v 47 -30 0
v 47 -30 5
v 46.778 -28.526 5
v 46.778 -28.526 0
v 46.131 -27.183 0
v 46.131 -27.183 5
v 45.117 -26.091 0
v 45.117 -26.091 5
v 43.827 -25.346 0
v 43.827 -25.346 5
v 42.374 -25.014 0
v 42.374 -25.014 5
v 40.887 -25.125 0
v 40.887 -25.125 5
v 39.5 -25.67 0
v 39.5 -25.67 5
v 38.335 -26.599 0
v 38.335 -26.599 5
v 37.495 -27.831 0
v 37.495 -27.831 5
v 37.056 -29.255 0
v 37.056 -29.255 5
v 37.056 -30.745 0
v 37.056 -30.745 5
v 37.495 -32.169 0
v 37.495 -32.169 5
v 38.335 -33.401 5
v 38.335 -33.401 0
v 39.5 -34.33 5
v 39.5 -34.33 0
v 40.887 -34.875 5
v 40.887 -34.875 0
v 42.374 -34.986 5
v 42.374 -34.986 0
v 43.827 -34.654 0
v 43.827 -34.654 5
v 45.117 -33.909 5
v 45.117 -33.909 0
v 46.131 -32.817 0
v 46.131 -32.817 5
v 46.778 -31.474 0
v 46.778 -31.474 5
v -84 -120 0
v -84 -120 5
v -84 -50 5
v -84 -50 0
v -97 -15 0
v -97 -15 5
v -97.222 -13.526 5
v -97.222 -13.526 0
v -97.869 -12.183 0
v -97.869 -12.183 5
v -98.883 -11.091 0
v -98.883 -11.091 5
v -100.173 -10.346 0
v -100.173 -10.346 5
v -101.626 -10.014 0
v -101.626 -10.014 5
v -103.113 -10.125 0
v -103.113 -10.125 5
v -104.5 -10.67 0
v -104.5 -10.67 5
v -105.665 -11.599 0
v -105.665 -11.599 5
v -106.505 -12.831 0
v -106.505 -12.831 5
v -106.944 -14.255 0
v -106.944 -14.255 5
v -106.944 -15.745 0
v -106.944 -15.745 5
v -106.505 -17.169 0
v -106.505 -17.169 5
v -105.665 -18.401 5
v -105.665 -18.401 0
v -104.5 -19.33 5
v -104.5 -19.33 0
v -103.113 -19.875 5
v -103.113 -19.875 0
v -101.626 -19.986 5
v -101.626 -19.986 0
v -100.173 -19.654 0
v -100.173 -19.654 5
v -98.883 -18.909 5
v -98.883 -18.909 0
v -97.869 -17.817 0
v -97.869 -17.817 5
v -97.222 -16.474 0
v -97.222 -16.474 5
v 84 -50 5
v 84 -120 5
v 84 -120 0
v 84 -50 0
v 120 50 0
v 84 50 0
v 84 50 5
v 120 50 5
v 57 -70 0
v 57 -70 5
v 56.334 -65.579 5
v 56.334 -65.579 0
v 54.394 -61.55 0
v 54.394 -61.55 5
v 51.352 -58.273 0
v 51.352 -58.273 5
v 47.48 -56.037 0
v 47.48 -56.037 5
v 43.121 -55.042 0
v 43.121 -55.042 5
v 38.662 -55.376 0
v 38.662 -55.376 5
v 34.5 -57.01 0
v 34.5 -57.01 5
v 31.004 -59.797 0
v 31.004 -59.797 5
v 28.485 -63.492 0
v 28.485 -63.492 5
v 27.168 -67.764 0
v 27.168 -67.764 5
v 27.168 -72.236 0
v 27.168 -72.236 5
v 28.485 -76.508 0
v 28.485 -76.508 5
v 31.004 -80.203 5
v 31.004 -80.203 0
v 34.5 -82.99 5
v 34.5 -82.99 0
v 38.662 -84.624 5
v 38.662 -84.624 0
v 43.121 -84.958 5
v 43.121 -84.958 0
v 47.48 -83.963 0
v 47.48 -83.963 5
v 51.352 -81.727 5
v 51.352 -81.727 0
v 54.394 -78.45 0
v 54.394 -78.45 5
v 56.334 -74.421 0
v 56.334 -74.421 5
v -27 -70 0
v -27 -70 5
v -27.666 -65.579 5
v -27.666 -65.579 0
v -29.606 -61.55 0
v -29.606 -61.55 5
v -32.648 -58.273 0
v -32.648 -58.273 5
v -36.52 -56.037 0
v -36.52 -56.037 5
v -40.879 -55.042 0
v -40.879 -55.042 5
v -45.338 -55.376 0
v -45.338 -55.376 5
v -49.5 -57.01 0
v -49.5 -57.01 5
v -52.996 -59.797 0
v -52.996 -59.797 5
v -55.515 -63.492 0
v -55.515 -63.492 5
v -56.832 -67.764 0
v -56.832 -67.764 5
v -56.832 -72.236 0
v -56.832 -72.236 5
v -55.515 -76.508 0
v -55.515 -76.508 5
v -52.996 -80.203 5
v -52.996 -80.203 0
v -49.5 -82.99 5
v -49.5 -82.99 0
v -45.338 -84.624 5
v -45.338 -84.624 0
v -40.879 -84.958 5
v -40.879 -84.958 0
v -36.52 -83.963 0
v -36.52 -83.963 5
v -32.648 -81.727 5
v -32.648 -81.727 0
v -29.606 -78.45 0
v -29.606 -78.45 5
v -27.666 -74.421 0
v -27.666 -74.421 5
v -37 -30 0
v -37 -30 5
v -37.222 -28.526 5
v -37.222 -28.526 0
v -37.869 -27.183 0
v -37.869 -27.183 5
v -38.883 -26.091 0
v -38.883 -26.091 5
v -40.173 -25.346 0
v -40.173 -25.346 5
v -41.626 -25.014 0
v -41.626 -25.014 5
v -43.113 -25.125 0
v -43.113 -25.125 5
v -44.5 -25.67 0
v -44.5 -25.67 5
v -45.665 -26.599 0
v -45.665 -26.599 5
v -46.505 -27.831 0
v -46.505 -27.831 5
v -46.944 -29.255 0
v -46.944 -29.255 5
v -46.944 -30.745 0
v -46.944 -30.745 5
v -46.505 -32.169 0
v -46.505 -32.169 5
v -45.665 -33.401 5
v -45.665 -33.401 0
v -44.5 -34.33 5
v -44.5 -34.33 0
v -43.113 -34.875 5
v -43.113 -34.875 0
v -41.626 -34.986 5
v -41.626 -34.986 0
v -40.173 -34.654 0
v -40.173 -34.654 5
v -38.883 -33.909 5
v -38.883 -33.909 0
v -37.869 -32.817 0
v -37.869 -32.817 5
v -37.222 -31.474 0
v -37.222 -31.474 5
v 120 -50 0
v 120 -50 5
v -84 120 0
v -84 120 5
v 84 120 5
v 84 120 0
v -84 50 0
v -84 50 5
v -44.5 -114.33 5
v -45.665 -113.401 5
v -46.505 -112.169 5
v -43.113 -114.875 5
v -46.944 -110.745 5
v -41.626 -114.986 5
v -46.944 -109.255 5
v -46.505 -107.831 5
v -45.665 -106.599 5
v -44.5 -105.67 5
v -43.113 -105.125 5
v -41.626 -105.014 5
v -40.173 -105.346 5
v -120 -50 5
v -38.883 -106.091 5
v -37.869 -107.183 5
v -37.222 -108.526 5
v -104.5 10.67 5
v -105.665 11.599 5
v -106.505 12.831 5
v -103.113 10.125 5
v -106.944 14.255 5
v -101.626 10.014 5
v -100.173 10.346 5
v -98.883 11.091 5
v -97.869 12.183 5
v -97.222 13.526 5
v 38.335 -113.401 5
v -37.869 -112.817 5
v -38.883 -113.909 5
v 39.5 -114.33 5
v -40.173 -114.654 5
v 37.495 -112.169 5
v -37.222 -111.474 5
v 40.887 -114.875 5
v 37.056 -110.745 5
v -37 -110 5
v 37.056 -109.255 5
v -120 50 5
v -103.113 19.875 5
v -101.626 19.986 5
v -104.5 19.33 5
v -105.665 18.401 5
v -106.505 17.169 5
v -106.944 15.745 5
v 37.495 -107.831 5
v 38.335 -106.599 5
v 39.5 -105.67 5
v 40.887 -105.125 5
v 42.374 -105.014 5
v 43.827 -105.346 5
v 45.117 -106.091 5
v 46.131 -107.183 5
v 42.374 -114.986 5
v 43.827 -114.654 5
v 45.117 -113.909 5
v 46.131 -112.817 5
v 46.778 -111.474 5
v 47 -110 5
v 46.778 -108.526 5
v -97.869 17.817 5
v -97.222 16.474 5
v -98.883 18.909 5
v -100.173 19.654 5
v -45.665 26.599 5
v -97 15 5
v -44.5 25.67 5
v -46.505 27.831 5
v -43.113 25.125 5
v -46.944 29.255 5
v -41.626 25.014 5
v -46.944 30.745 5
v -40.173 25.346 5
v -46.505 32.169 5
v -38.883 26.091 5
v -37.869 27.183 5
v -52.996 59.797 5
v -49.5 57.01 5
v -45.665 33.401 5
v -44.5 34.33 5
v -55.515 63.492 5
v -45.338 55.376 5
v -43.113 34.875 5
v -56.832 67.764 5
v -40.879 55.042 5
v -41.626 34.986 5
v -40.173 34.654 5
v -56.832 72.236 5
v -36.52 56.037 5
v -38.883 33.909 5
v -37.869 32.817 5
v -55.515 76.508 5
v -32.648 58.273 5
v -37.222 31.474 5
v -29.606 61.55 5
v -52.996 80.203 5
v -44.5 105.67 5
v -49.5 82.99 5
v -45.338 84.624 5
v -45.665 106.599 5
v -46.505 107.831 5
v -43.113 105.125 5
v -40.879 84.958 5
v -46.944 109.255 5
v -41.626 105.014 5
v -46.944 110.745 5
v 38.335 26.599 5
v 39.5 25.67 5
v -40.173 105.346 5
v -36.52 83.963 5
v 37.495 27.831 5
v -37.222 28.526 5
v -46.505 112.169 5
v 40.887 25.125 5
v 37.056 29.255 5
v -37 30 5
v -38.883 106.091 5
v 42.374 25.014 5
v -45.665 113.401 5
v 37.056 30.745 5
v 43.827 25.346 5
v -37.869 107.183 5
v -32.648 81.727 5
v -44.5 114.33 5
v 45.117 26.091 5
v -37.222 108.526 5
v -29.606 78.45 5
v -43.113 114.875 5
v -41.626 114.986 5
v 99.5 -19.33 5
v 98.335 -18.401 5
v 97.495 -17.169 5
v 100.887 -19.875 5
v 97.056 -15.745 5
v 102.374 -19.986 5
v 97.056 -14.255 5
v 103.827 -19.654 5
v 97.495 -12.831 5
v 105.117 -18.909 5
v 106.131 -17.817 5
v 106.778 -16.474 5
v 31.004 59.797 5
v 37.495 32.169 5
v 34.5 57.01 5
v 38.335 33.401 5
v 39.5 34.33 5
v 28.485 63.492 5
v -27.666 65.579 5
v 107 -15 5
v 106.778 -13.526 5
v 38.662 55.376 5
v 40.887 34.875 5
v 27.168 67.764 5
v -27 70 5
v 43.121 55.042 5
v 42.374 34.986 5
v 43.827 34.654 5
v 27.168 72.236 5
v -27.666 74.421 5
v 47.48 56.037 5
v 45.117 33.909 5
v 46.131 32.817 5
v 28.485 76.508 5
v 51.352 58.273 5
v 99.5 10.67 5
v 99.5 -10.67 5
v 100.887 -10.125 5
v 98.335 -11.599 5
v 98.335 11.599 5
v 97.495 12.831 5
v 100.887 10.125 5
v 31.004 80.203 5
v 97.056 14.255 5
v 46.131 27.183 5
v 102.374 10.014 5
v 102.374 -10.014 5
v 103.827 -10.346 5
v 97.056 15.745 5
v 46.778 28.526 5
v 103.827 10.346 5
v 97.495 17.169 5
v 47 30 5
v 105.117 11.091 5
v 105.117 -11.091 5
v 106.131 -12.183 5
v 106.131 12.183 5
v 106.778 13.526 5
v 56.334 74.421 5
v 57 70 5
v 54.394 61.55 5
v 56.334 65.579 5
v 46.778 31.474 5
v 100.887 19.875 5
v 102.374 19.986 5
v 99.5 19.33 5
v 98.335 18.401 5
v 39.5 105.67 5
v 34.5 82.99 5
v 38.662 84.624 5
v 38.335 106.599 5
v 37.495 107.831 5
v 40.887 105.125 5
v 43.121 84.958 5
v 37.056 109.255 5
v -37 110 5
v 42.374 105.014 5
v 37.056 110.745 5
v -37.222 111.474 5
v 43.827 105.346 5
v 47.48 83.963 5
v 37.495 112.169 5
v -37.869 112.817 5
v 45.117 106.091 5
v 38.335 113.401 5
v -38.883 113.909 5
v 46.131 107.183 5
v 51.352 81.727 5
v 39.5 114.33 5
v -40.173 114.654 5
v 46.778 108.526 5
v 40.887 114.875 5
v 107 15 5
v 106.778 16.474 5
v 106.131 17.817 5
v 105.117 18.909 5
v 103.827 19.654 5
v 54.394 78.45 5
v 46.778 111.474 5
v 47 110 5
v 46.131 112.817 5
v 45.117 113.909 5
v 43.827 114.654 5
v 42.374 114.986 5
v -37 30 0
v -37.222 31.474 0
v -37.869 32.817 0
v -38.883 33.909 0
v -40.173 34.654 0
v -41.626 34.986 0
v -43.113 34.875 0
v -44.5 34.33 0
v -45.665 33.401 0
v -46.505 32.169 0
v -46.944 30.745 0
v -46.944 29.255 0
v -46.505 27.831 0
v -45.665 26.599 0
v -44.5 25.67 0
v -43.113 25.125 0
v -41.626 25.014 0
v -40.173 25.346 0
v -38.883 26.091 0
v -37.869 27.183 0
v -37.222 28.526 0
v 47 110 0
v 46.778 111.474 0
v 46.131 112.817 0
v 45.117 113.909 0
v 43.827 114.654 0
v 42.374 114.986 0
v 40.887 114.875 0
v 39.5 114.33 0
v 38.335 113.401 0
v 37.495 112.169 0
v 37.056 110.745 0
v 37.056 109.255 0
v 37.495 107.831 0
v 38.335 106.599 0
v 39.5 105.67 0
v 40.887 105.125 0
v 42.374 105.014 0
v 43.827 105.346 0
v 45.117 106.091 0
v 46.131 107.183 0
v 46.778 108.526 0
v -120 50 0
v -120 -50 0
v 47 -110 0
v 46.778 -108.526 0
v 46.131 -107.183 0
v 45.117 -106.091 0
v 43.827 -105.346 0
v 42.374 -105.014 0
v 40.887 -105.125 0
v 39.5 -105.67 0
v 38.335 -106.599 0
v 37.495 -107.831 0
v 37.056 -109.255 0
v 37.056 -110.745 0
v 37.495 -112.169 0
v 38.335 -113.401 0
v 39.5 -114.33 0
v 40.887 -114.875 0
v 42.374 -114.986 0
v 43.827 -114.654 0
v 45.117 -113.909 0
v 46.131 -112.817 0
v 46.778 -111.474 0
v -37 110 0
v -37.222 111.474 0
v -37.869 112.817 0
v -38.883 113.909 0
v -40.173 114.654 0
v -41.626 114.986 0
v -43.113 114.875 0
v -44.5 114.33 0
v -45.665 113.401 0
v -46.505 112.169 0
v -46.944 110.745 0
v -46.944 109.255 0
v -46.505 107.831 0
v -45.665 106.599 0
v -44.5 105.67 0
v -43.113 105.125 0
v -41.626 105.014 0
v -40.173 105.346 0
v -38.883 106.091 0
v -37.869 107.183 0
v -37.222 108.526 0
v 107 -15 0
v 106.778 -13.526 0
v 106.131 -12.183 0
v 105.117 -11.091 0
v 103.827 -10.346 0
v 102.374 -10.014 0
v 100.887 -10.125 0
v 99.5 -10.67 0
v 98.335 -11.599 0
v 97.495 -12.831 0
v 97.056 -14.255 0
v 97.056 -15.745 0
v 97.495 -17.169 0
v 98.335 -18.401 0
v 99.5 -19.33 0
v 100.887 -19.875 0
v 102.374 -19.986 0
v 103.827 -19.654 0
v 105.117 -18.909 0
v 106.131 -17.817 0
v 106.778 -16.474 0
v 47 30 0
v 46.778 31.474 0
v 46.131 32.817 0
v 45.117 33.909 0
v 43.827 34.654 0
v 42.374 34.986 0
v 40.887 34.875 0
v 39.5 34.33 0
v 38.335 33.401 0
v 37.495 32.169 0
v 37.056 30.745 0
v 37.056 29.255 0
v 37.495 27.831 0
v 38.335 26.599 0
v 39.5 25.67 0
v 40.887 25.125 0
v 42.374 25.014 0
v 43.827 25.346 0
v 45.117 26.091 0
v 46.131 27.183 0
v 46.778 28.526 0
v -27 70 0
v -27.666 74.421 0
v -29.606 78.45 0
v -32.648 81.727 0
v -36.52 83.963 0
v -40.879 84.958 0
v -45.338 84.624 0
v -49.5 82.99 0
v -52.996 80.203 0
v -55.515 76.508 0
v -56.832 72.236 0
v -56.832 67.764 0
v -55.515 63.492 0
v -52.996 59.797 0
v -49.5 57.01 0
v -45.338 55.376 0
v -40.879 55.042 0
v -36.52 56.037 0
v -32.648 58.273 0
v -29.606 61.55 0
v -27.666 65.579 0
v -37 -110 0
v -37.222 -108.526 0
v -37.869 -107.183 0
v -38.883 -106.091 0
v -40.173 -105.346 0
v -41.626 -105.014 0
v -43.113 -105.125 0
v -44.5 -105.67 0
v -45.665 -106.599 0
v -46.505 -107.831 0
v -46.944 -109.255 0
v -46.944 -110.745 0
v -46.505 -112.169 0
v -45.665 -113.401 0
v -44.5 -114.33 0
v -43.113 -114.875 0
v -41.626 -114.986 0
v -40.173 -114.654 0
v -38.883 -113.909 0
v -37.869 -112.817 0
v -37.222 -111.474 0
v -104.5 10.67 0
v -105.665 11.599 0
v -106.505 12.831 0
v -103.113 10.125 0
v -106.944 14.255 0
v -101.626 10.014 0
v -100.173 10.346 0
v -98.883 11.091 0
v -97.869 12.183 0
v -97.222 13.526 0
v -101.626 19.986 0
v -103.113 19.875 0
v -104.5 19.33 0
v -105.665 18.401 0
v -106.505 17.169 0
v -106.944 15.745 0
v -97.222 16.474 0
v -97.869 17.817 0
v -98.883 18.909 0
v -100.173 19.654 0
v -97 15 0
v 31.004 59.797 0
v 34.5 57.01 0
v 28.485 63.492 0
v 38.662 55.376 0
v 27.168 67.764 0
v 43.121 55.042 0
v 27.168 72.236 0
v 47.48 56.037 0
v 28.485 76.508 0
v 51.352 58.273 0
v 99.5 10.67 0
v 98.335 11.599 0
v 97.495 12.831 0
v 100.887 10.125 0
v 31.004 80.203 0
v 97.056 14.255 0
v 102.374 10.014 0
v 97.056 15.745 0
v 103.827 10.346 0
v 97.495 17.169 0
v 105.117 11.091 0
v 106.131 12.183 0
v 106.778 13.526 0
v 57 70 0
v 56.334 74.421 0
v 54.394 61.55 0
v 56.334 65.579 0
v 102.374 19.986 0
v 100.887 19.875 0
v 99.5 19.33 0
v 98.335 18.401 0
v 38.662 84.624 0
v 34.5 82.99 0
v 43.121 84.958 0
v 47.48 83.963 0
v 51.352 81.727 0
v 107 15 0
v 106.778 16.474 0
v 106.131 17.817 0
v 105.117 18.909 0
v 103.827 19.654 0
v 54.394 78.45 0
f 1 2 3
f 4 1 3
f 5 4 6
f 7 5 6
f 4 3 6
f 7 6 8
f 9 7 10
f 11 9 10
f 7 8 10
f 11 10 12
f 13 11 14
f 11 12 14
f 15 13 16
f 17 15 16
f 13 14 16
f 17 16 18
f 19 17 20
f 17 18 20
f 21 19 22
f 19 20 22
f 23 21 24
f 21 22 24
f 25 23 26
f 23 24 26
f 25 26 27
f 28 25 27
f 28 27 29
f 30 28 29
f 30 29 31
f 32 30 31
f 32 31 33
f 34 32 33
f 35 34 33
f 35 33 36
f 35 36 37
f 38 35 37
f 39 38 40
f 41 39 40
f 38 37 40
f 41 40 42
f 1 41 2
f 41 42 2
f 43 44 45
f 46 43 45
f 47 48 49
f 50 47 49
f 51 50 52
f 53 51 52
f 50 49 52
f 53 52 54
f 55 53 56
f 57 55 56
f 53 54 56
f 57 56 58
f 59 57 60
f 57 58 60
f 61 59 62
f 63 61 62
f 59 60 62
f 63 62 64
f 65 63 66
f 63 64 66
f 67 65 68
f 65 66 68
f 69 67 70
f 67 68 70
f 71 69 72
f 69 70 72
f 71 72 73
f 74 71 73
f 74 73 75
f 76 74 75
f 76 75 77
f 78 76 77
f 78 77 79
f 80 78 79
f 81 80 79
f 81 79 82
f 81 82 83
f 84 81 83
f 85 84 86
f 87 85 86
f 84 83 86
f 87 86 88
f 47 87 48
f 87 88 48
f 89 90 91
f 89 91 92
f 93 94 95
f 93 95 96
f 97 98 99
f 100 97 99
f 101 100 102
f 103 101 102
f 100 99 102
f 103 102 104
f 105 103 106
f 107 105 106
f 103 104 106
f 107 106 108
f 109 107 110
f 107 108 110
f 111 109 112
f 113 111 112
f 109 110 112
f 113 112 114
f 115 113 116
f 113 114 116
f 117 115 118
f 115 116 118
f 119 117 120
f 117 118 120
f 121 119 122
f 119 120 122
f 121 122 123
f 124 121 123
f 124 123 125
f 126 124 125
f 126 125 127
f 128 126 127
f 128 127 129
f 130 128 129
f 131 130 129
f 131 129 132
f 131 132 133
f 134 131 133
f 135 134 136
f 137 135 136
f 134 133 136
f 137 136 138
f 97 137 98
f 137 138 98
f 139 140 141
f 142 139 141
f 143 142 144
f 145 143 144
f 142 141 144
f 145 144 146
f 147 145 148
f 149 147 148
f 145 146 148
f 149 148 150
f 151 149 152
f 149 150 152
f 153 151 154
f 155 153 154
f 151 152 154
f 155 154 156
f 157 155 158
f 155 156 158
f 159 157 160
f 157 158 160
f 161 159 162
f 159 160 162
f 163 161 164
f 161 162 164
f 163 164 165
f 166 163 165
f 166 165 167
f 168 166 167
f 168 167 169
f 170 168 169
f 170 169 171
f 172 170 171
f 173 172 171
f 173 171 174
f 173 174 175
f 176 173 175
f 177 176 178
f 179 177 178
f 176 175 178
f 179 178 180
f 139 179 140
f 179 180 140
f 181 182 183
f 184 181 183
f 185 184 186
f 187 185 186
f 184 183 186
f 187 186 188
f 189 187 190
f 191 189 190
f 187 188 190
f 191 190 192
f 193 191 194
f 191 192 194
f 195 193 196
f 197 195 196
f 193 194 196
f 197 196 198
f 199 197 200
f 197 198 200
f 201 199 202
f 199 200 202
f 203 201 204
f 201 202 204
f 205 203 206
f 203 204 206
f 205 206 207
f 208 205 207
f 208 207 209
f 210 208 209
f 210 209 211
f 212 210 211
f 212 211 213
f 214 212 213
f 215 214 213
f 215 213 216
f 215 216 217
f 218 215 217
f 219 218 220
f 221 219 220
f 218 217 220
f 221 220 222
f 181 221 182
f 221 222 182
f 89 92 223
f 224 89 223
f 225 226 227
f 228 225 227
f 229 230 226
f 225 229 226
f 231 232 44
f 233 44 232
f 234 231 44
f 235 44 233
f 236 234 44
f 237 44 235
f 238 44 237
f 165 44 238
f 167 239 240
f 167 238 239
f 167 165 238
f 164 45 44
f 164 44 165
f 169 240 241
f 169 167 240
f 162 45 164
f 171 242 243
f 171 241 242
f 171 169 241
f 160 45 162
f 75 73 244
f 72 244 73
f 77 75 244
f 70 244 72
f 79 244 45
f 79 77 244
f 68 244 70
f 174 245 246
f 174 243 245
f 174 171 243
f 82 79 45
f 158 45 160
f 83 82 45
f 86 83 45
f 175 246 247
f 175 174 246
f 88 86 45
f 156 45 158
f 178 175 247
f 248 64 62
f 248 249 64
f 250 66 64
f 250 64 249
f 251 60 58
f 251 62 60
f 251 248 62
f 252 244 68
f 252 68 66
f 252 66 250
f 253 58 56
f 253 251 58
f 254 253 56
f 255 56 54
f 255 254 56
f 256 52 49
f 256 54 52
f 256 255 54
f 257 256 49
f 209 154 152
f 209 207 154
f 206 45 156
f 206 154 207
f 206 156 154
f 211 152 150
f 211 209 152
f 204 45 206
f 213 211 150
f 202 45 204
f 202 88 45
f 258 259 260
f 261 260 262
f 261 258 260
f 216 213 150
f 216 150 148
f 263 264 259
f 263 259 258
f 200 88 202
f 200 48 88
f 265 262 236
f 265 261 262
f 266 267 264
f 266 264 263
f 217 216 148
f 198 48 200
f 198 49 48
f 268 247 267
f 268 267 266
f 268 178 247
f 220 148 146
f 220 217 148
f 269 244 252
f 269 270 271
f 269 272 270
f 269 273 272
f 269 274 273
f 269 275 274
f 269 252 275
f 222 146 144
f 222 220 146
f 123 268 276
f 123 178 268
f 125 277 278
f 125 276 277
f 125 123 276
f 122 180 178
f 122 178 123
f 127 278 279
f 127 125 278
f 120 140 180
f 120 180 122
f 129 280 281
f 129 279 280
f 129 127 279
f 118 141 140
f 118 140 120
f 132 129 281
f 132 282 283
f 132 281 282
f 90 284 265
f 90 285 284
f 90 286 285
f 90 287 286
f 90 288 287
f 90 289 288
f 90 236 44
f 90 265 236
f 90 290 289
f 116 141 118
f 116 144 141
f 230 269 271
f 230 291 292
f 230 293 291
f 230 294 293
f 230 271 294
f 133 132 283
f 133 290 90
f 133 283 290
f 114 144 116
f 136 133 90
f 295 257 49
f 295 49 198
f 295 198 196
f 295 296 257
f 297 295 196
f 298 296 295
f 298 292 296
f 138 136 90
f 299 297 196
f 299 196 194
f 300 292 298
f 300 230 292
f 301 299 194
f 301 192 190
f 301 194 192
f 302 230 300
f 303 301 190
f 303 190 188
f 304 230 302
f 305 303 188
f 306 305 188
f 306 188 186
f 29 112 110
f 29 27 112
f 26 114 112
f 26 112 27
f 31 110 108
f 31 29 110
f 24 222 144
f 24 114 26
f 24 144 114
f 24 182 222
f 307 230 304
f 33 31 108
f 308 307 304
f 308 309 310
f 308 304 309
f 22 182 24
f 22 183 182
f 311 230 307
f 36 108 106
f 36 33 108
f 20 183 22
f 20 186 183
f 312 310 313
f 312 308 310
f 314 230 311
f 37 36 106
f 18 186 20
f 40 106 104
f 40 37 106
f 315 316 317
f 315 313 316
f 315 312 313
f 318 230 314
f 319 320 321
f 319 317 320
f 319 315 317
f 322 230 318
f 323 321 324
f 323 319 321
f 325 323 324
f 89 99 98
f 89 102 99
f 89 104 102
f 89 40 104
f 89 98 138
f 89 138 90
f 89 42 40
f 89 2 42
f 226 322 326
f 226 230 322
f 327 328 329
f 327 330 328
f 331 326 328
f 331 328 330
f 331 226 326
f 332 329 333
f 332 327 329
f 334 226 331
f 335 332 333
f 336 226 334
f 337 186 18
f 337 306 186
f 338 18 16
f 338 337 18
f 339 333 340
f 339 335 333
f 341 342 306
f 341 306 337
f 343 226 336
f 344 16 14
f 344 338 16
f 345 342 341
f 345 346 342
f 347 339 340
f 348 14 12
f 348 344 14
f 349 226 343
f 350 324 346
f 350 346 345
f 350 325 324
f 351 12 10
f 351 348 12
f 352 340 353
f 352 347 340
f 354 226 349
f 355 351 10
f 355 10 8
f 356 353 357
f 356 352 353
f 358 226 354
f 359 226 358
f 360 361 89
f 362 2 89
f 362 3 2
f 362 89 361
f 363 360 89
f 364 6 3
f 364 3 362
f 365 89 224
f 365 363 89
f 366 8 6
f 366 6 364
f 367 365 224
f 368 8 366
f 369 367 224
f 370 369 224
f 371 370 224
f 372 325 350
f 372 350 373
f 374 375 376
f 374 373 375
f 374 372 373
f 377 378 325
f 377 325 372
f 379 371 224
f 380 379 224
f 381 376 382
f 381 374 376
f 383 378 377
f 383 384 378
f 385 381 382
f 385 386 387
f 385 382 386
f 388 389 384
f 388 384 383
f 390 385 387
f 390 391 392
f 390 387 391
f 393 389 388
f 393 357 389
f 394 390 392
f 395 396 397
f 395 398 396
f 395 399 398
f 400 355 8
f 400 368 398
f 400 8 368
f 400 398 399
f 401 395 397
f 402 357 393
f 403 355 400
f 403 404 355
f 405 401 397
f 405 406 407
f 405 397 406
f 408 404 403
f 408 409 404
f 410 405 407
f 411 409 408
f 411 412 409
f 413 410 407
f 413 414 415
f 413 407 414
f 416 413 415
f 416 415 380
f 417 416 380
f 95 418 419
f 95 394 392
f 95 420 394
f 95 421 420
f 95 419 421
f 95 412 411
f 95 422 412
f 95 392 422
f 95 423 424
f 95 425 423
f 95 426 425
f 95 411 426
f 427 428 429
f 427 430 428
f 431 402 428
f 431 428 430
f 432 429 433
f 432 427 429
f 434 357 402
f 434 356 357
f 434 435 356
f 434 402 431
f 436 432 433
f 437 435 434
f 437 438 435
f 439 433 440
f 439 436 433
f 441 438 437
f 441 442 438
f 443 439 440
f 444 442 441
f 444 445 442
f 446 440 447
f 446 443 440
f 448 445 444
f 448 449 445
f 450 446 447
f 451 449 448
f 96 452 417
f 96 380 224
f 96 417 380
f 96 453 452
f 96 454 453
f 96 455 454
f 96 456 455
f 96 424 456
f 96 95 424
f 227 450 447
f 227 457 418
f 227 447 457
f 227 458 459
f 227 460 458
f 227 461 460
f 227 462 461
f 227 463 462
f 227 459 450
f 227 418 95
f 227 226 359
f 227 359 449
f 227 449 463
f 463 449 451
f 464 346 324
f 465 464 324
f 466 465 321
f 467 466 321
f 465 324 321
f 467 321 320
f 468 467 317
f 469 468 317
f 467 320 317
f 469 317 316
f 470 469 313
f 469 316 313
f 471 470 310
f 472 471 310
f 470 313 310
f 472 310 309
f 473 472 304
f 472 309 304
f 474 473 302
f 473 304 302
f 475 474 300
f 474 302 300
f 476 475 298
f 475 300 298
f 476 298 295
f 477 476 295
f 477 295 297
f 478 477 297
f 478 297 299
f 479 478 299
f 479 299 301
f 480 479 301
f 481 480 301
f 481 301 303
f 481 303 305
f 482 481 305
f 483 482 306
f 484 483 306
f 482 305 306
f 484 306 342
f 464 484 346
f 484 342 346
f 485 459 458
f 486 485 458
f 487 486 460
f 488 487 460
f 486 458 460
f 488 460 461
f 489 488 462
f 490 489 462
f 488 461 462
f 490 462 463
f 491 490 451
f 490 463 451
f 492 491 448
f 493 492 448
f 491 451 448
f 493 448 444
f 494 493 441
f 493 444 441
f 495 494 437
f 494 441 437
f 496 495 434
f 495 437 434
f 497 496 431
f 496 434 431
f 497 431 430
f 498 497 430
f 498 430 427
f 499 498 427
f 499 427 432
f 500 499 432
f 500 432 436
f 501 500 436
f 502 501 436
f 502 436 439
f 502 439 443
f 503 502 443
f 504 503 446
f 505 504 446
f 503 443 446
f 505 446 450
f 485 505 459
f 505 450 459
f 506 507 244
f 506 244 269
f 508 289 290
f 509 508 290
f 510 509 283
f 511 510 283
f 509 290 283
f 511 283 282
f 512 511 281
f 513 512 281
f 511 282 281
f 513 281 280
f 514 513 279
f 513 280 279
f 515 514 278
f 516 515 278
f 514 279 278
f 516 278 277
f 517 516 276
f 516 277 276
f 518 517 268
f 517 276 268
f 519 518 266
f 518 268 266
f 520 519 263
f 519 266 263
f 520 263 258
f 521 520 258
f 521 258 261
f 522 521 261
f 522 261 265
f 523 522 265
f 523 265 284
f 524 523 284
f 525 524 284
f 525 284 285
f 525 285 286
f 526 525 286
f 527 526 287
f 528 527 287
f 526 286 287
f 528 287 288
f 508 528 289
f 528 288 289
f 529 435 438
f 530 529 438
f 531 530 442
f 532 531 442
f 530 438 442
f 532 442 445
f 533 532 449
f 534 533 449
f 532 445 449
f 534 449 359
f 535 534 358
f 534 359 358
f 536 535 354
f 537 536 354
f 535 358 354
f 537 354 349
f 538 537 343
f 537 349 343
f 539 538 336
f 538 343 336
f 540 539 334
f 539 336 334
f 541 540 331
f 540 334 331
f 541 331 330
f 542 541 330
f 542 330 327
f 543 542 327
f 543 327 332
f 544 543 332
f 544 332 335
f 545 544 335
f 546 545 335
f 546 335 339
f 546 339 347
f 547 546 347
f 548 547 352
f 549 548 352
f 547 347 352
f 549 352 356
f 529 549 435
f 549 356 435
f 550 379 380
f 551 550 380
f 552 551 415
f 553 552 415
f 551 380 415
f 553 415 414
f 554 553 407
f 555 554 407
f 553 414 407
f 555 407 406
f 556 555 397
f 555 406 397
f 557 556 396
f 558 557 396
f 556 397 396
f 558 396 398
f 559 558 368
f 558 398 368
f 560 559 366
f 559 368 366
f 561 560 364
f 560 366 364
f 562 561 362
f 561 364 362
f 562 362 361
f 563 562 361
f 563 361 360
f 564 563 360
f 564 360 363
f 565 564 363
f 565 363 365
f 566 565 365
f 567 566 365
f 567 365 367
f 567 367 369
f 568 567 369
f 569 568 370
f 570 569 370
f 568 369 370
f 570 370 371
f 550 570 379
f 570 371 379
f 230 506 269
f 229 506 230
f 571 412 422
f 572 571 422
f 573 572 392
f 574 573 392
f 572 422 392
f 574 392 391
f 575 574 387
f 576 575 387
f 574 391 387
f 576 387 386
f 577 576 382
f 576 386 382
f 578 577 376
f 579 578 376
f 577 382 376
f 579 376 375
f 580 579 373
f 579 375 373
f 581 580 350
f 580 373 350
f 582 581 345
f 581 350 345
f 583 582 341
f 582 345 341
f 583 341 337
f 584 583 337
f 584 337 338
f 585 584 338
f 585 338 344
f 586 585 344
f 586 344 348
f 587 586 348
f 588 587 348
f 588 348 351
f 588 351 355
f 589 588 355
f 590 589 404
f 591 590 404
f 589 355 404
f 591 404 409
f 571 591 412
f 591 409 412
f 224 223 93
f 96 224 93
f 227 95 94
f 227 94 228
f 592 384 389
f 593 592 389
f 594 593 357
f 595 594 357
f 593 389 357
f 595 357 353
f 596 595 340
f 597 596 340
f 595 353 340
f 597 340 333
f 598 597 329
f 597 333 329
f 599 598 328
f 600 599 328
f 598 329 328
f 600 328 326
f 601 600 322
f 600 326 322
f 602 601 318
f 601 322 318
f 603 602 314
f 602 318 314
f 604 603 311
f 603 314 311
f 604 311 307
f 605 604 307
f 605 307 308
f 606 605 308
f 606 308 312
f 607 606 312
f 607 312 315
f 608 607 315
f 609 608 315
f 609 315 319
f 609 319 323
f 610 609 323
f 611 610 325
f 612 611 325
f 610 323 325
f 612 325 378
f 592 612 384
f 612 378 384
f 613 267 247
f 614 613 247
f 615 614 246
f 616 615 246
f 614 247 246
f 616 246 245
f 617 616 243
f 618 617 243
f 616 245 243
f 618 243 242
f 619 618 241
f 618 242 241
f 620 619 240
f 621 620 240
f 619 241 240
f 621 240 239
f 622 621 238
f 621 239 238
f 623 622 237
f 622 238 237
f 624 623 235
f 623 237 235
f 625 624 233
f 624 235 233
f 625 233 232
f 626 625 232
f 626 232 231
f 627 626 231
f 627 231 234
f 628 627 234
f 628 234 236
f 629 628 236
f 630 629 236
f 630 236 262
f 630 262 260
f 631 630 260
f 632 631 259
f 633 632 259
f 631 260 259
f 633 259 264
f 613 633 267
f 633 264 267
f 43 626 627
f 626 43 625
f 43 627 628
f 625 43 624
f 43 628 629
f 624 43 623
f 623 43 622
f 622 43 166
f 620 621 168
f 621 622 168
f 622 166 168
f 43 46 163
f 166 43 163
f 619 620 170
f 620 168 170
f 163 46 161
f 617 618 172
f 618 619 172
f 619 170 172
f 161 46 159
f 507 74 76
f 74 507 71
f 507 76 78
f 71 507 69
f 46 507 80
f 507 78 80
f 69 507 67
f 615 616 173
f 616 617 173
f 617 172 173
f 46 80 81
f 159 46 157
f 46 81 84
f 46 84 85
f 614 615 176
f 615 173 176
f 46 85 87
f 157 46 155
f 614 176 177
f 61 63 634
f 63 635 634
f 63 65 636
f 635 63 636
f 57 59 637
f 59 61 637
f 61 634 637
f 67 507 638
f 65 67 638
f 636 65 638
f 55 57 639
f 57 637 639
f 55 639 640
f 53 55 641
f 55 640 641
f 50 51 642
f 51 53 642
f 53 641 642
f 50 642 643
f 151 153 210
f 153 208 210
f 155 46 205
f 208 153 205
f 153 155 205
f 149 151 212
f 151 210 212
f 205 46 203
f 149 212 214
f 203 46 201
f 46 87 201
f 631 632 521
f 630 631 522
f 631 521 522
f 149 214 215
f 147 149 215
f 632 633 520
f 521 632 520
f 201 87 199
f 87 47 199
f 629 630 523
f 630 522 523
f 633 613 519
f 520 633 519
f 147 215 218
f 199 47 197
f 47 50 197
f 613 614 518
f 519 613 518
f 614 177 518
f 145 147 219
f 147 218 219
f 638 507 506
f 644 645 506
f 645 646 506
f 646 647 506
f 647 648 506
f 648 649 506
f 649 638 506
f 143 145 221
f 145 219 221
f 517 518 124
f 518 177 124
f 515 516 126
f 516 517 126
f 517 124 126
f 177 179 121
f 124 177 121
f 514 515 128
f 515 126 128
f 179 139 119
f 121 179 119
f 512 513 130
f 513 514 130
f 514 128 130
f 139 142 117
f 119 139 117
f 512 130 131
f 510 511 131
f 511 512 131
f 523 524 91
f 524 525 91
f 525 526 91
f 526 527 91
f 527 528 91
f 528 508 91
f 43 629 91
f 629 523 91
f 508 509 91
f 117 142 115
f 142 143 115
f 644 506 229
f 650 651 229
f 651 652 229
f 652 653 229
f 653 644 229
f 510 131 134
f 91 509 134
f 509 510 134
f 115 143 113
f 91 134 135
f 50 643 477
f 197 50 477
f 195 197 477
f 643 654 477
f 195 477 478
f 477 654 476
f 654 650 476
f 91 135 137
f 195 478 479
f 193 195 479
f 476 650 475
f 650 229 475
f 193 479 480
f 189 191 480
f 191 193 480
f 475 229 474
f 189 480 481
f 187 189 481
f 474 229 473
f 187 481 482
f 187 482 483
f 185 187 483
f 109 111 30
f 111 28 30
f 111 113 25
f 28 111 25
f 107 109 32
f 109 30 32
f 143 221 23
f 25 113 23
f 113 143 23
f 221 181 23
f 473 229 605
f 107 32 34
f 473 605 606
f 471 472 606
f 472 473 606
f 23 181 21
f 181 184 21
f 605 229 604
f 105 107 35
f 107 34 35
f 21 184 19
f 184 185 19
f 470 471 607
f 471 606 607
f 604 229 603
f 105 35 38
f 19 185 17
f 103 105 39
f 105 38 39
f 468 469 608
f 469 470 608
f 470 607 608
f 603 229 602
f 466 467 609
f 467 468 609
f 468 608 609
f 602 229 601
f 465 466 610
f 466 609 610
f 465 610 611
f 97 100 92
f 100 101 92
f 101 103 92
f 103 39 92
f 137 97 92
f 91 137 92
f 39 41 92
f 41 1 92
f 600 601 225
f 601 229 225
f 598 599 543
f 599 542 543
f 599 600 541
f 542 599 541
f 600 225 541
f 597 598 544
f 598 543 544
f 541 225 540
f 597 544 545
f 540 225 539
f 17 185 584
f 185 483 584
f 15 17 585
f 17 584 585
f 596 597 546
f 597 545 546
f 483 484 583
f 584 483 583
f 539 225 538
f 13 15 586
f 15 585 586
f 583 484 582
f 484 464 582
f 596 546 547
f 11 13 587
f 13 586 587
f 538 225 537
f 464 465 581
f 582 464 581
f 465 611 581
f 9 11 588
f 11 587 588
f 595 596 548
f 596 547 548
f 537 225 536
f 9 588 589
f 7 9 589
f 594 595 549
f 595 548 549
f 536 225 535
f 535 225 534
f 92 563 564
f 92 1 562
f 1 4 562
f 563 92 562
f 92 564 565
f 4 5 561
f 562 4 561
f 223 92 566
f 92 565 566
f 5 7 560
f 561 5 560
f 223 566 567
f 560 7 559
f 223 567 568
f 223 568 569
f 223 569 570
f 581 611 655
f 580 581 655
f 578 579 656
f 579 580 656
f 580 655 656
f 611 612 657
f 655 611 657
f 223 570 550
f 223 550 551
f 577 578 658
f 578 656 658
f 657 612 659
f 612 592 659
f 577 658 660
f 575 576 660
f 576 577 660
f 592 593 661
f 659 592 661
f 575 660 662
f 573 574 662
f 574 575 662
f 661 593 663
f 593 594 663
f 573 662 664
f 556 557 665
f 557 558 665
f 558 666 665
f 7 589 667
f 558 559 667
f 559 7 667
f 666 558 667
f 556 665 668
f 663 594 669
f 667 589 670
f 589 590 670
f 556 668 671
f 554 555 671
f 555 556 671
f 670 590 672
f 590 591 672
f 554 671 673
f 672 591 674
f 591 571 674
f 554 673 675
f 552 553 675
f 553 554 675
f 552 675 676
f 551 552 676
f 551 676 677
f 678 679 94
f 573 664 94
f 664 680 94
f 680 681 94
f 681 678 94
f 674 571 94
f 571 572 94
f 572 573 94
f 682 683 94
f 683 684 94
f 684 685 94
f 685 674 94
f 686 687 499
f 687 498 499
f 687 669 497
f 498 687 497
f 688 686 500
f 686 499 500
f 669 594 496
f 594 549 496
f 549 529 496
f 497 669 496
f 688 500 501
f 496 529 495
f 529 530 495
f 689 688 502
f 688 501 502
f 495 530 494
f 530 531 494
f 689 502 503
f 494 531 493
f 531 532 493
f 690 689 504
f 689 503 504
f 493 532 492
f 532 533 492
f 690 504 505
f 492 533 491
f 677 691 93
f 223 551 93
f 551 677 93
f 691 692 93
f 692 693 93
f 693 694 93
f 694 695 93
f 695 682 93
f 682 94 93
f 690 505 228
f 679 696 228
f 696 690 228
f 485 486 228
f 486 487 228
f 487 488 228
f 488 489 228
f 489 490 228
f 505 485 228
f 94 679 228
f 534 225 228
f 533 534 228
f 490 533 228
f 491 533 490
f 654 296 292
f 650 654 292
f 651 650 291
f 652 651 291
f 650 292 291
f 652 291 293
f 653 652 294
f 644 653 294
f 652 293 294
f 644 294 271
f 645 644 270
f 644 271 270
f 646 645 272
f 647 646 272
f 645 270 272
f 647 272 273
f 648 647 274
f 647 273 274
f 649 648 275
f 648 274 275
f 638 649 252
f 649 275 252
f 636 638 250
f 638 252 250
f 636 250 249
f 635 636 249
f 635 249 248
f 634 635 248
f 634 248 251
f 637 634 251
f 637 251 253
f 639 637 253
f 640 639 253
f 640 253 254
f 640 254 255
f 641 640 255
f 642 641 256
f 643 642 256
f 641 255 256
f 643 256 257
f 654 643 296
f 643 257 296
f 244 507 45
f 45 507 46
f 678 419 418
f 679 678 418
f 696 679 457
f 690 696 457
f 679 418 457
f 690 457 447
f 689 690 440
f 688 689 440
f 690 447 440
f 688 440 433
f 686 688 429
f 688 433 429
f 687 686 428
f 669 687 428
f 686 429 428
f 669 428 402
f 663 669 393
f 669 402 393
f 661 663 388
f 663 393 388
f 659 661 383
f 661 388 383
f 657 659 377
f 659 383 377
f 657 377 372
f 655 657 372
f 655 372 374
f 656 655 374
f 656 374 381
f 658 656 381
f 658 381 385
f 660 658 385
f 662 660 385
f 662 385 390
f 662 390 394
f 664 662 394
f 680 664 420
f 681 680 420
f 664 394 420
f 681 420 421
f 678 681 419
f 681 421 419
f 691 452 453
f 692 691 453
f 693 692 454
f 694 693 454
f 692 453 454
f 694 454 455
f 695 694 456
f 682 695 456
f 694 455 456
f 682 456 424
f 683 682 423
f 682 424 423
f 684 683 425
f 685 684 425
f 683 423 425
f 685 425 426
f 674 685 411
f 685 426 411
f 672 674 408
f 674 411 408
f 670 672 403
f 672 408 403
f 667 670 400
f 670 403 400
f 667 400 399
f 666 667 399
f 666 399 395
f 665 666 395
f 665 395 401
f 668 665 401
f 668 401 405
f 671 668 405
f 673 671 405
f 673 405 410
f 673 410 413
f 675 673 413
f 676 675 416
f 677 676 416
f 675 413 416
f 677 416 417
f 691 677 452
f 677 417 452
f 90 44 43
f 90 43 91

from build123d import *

# Parameters (mm, degrees)
SKETCH1_W           = 240
SKETCH1_H           = 100
BOSS_EXTRUDE1_DEPTH = 5
SKETCH2_W           = 168
SKETCH2_H           = 240
BOSS_EXTRUDE2_DEPTH = 5
SKETCH3_R           = 5
CUT_EXTRUDE1_DEPTH  = 5
SKETCH4_R           = 15
SKETCH4_R_2         = 5
CUT_EXTRUDE2_DEPTH  = 5


with BuildPart() as part:
    # Sketch1 → Boss-Extrude1 (new body)
    with BuildSketch(Plane.XY):
        Rectangle(SKETCH1_W, SKETCH1_H)
    extrude(amount=BOSS_EXTRUDE1_DEPTH)

    # Sketch2 → Boss-Extrude2 (add)
    with BuildSketch(Plane.XY.offset(5)):
        Rectangle(SKETCH2_W, SKETCH2_H)
    extrude(amount=-BOSS_EXTRUDE2_DEPTH)

    # Sketch3 → Cut-Extrude1 (cut)
    with BuildSketch(Plane.XY.offset(5)):
        with Locations((-102, 15)):
            Circle(SKETCH3_R)
        with Locations((102, 15)):
            Circle(SKETCH3_R)
        with Locations((102, -15)):
            Circle(SKETCH3_R)
        with Locations((-102, -15)):
            Circle(SKETCH3_R)
    extrude(amount=-CUT_EXTRUDE1_DEPTH, mode=Mode.SUBTRACT)

    # Sketch4 → Cut-Extrude2 (cut)
    with BuildSketch(Plane.XY.offset(5)):
        with Locations((-42, -70)):
            Circle(SKETCH4_R)
        with Locations((42, -70)):
            Circle(SKETCH4_R)
        with Locations((-42, -30)):
            Circle(SKETCH4_R_2)
        with Locations((-42, -110)):
            Circle(SKETCH4_R_2)
        with Locations((42, -110)):
            Circle(SKETCH4_R_2)
        with Locations((42, -30)):
            Circle(SKETCH4_R_2)
        with Locations((42, 30)):
            Circle(SKETCH4_R_2)
        with Locations((42, 110)):
            Circle(SKETCH4_R_2)
        with Locations((-42, 110)):
            Circle(SKETCH4_R_2)
        with Locations((-42, 30)):
            Circle(SKETCH4_R_2)
        with Locations((42, 70)):
            Circle(SKETCH4_R)
        with Locations((-42, 70)):
            Circle(SKETCH4_R)
    extrude(amount=-CUT_EXTRUDE2_DEPTH, mode=Mode.SUBTRACT)


solid = part.part
